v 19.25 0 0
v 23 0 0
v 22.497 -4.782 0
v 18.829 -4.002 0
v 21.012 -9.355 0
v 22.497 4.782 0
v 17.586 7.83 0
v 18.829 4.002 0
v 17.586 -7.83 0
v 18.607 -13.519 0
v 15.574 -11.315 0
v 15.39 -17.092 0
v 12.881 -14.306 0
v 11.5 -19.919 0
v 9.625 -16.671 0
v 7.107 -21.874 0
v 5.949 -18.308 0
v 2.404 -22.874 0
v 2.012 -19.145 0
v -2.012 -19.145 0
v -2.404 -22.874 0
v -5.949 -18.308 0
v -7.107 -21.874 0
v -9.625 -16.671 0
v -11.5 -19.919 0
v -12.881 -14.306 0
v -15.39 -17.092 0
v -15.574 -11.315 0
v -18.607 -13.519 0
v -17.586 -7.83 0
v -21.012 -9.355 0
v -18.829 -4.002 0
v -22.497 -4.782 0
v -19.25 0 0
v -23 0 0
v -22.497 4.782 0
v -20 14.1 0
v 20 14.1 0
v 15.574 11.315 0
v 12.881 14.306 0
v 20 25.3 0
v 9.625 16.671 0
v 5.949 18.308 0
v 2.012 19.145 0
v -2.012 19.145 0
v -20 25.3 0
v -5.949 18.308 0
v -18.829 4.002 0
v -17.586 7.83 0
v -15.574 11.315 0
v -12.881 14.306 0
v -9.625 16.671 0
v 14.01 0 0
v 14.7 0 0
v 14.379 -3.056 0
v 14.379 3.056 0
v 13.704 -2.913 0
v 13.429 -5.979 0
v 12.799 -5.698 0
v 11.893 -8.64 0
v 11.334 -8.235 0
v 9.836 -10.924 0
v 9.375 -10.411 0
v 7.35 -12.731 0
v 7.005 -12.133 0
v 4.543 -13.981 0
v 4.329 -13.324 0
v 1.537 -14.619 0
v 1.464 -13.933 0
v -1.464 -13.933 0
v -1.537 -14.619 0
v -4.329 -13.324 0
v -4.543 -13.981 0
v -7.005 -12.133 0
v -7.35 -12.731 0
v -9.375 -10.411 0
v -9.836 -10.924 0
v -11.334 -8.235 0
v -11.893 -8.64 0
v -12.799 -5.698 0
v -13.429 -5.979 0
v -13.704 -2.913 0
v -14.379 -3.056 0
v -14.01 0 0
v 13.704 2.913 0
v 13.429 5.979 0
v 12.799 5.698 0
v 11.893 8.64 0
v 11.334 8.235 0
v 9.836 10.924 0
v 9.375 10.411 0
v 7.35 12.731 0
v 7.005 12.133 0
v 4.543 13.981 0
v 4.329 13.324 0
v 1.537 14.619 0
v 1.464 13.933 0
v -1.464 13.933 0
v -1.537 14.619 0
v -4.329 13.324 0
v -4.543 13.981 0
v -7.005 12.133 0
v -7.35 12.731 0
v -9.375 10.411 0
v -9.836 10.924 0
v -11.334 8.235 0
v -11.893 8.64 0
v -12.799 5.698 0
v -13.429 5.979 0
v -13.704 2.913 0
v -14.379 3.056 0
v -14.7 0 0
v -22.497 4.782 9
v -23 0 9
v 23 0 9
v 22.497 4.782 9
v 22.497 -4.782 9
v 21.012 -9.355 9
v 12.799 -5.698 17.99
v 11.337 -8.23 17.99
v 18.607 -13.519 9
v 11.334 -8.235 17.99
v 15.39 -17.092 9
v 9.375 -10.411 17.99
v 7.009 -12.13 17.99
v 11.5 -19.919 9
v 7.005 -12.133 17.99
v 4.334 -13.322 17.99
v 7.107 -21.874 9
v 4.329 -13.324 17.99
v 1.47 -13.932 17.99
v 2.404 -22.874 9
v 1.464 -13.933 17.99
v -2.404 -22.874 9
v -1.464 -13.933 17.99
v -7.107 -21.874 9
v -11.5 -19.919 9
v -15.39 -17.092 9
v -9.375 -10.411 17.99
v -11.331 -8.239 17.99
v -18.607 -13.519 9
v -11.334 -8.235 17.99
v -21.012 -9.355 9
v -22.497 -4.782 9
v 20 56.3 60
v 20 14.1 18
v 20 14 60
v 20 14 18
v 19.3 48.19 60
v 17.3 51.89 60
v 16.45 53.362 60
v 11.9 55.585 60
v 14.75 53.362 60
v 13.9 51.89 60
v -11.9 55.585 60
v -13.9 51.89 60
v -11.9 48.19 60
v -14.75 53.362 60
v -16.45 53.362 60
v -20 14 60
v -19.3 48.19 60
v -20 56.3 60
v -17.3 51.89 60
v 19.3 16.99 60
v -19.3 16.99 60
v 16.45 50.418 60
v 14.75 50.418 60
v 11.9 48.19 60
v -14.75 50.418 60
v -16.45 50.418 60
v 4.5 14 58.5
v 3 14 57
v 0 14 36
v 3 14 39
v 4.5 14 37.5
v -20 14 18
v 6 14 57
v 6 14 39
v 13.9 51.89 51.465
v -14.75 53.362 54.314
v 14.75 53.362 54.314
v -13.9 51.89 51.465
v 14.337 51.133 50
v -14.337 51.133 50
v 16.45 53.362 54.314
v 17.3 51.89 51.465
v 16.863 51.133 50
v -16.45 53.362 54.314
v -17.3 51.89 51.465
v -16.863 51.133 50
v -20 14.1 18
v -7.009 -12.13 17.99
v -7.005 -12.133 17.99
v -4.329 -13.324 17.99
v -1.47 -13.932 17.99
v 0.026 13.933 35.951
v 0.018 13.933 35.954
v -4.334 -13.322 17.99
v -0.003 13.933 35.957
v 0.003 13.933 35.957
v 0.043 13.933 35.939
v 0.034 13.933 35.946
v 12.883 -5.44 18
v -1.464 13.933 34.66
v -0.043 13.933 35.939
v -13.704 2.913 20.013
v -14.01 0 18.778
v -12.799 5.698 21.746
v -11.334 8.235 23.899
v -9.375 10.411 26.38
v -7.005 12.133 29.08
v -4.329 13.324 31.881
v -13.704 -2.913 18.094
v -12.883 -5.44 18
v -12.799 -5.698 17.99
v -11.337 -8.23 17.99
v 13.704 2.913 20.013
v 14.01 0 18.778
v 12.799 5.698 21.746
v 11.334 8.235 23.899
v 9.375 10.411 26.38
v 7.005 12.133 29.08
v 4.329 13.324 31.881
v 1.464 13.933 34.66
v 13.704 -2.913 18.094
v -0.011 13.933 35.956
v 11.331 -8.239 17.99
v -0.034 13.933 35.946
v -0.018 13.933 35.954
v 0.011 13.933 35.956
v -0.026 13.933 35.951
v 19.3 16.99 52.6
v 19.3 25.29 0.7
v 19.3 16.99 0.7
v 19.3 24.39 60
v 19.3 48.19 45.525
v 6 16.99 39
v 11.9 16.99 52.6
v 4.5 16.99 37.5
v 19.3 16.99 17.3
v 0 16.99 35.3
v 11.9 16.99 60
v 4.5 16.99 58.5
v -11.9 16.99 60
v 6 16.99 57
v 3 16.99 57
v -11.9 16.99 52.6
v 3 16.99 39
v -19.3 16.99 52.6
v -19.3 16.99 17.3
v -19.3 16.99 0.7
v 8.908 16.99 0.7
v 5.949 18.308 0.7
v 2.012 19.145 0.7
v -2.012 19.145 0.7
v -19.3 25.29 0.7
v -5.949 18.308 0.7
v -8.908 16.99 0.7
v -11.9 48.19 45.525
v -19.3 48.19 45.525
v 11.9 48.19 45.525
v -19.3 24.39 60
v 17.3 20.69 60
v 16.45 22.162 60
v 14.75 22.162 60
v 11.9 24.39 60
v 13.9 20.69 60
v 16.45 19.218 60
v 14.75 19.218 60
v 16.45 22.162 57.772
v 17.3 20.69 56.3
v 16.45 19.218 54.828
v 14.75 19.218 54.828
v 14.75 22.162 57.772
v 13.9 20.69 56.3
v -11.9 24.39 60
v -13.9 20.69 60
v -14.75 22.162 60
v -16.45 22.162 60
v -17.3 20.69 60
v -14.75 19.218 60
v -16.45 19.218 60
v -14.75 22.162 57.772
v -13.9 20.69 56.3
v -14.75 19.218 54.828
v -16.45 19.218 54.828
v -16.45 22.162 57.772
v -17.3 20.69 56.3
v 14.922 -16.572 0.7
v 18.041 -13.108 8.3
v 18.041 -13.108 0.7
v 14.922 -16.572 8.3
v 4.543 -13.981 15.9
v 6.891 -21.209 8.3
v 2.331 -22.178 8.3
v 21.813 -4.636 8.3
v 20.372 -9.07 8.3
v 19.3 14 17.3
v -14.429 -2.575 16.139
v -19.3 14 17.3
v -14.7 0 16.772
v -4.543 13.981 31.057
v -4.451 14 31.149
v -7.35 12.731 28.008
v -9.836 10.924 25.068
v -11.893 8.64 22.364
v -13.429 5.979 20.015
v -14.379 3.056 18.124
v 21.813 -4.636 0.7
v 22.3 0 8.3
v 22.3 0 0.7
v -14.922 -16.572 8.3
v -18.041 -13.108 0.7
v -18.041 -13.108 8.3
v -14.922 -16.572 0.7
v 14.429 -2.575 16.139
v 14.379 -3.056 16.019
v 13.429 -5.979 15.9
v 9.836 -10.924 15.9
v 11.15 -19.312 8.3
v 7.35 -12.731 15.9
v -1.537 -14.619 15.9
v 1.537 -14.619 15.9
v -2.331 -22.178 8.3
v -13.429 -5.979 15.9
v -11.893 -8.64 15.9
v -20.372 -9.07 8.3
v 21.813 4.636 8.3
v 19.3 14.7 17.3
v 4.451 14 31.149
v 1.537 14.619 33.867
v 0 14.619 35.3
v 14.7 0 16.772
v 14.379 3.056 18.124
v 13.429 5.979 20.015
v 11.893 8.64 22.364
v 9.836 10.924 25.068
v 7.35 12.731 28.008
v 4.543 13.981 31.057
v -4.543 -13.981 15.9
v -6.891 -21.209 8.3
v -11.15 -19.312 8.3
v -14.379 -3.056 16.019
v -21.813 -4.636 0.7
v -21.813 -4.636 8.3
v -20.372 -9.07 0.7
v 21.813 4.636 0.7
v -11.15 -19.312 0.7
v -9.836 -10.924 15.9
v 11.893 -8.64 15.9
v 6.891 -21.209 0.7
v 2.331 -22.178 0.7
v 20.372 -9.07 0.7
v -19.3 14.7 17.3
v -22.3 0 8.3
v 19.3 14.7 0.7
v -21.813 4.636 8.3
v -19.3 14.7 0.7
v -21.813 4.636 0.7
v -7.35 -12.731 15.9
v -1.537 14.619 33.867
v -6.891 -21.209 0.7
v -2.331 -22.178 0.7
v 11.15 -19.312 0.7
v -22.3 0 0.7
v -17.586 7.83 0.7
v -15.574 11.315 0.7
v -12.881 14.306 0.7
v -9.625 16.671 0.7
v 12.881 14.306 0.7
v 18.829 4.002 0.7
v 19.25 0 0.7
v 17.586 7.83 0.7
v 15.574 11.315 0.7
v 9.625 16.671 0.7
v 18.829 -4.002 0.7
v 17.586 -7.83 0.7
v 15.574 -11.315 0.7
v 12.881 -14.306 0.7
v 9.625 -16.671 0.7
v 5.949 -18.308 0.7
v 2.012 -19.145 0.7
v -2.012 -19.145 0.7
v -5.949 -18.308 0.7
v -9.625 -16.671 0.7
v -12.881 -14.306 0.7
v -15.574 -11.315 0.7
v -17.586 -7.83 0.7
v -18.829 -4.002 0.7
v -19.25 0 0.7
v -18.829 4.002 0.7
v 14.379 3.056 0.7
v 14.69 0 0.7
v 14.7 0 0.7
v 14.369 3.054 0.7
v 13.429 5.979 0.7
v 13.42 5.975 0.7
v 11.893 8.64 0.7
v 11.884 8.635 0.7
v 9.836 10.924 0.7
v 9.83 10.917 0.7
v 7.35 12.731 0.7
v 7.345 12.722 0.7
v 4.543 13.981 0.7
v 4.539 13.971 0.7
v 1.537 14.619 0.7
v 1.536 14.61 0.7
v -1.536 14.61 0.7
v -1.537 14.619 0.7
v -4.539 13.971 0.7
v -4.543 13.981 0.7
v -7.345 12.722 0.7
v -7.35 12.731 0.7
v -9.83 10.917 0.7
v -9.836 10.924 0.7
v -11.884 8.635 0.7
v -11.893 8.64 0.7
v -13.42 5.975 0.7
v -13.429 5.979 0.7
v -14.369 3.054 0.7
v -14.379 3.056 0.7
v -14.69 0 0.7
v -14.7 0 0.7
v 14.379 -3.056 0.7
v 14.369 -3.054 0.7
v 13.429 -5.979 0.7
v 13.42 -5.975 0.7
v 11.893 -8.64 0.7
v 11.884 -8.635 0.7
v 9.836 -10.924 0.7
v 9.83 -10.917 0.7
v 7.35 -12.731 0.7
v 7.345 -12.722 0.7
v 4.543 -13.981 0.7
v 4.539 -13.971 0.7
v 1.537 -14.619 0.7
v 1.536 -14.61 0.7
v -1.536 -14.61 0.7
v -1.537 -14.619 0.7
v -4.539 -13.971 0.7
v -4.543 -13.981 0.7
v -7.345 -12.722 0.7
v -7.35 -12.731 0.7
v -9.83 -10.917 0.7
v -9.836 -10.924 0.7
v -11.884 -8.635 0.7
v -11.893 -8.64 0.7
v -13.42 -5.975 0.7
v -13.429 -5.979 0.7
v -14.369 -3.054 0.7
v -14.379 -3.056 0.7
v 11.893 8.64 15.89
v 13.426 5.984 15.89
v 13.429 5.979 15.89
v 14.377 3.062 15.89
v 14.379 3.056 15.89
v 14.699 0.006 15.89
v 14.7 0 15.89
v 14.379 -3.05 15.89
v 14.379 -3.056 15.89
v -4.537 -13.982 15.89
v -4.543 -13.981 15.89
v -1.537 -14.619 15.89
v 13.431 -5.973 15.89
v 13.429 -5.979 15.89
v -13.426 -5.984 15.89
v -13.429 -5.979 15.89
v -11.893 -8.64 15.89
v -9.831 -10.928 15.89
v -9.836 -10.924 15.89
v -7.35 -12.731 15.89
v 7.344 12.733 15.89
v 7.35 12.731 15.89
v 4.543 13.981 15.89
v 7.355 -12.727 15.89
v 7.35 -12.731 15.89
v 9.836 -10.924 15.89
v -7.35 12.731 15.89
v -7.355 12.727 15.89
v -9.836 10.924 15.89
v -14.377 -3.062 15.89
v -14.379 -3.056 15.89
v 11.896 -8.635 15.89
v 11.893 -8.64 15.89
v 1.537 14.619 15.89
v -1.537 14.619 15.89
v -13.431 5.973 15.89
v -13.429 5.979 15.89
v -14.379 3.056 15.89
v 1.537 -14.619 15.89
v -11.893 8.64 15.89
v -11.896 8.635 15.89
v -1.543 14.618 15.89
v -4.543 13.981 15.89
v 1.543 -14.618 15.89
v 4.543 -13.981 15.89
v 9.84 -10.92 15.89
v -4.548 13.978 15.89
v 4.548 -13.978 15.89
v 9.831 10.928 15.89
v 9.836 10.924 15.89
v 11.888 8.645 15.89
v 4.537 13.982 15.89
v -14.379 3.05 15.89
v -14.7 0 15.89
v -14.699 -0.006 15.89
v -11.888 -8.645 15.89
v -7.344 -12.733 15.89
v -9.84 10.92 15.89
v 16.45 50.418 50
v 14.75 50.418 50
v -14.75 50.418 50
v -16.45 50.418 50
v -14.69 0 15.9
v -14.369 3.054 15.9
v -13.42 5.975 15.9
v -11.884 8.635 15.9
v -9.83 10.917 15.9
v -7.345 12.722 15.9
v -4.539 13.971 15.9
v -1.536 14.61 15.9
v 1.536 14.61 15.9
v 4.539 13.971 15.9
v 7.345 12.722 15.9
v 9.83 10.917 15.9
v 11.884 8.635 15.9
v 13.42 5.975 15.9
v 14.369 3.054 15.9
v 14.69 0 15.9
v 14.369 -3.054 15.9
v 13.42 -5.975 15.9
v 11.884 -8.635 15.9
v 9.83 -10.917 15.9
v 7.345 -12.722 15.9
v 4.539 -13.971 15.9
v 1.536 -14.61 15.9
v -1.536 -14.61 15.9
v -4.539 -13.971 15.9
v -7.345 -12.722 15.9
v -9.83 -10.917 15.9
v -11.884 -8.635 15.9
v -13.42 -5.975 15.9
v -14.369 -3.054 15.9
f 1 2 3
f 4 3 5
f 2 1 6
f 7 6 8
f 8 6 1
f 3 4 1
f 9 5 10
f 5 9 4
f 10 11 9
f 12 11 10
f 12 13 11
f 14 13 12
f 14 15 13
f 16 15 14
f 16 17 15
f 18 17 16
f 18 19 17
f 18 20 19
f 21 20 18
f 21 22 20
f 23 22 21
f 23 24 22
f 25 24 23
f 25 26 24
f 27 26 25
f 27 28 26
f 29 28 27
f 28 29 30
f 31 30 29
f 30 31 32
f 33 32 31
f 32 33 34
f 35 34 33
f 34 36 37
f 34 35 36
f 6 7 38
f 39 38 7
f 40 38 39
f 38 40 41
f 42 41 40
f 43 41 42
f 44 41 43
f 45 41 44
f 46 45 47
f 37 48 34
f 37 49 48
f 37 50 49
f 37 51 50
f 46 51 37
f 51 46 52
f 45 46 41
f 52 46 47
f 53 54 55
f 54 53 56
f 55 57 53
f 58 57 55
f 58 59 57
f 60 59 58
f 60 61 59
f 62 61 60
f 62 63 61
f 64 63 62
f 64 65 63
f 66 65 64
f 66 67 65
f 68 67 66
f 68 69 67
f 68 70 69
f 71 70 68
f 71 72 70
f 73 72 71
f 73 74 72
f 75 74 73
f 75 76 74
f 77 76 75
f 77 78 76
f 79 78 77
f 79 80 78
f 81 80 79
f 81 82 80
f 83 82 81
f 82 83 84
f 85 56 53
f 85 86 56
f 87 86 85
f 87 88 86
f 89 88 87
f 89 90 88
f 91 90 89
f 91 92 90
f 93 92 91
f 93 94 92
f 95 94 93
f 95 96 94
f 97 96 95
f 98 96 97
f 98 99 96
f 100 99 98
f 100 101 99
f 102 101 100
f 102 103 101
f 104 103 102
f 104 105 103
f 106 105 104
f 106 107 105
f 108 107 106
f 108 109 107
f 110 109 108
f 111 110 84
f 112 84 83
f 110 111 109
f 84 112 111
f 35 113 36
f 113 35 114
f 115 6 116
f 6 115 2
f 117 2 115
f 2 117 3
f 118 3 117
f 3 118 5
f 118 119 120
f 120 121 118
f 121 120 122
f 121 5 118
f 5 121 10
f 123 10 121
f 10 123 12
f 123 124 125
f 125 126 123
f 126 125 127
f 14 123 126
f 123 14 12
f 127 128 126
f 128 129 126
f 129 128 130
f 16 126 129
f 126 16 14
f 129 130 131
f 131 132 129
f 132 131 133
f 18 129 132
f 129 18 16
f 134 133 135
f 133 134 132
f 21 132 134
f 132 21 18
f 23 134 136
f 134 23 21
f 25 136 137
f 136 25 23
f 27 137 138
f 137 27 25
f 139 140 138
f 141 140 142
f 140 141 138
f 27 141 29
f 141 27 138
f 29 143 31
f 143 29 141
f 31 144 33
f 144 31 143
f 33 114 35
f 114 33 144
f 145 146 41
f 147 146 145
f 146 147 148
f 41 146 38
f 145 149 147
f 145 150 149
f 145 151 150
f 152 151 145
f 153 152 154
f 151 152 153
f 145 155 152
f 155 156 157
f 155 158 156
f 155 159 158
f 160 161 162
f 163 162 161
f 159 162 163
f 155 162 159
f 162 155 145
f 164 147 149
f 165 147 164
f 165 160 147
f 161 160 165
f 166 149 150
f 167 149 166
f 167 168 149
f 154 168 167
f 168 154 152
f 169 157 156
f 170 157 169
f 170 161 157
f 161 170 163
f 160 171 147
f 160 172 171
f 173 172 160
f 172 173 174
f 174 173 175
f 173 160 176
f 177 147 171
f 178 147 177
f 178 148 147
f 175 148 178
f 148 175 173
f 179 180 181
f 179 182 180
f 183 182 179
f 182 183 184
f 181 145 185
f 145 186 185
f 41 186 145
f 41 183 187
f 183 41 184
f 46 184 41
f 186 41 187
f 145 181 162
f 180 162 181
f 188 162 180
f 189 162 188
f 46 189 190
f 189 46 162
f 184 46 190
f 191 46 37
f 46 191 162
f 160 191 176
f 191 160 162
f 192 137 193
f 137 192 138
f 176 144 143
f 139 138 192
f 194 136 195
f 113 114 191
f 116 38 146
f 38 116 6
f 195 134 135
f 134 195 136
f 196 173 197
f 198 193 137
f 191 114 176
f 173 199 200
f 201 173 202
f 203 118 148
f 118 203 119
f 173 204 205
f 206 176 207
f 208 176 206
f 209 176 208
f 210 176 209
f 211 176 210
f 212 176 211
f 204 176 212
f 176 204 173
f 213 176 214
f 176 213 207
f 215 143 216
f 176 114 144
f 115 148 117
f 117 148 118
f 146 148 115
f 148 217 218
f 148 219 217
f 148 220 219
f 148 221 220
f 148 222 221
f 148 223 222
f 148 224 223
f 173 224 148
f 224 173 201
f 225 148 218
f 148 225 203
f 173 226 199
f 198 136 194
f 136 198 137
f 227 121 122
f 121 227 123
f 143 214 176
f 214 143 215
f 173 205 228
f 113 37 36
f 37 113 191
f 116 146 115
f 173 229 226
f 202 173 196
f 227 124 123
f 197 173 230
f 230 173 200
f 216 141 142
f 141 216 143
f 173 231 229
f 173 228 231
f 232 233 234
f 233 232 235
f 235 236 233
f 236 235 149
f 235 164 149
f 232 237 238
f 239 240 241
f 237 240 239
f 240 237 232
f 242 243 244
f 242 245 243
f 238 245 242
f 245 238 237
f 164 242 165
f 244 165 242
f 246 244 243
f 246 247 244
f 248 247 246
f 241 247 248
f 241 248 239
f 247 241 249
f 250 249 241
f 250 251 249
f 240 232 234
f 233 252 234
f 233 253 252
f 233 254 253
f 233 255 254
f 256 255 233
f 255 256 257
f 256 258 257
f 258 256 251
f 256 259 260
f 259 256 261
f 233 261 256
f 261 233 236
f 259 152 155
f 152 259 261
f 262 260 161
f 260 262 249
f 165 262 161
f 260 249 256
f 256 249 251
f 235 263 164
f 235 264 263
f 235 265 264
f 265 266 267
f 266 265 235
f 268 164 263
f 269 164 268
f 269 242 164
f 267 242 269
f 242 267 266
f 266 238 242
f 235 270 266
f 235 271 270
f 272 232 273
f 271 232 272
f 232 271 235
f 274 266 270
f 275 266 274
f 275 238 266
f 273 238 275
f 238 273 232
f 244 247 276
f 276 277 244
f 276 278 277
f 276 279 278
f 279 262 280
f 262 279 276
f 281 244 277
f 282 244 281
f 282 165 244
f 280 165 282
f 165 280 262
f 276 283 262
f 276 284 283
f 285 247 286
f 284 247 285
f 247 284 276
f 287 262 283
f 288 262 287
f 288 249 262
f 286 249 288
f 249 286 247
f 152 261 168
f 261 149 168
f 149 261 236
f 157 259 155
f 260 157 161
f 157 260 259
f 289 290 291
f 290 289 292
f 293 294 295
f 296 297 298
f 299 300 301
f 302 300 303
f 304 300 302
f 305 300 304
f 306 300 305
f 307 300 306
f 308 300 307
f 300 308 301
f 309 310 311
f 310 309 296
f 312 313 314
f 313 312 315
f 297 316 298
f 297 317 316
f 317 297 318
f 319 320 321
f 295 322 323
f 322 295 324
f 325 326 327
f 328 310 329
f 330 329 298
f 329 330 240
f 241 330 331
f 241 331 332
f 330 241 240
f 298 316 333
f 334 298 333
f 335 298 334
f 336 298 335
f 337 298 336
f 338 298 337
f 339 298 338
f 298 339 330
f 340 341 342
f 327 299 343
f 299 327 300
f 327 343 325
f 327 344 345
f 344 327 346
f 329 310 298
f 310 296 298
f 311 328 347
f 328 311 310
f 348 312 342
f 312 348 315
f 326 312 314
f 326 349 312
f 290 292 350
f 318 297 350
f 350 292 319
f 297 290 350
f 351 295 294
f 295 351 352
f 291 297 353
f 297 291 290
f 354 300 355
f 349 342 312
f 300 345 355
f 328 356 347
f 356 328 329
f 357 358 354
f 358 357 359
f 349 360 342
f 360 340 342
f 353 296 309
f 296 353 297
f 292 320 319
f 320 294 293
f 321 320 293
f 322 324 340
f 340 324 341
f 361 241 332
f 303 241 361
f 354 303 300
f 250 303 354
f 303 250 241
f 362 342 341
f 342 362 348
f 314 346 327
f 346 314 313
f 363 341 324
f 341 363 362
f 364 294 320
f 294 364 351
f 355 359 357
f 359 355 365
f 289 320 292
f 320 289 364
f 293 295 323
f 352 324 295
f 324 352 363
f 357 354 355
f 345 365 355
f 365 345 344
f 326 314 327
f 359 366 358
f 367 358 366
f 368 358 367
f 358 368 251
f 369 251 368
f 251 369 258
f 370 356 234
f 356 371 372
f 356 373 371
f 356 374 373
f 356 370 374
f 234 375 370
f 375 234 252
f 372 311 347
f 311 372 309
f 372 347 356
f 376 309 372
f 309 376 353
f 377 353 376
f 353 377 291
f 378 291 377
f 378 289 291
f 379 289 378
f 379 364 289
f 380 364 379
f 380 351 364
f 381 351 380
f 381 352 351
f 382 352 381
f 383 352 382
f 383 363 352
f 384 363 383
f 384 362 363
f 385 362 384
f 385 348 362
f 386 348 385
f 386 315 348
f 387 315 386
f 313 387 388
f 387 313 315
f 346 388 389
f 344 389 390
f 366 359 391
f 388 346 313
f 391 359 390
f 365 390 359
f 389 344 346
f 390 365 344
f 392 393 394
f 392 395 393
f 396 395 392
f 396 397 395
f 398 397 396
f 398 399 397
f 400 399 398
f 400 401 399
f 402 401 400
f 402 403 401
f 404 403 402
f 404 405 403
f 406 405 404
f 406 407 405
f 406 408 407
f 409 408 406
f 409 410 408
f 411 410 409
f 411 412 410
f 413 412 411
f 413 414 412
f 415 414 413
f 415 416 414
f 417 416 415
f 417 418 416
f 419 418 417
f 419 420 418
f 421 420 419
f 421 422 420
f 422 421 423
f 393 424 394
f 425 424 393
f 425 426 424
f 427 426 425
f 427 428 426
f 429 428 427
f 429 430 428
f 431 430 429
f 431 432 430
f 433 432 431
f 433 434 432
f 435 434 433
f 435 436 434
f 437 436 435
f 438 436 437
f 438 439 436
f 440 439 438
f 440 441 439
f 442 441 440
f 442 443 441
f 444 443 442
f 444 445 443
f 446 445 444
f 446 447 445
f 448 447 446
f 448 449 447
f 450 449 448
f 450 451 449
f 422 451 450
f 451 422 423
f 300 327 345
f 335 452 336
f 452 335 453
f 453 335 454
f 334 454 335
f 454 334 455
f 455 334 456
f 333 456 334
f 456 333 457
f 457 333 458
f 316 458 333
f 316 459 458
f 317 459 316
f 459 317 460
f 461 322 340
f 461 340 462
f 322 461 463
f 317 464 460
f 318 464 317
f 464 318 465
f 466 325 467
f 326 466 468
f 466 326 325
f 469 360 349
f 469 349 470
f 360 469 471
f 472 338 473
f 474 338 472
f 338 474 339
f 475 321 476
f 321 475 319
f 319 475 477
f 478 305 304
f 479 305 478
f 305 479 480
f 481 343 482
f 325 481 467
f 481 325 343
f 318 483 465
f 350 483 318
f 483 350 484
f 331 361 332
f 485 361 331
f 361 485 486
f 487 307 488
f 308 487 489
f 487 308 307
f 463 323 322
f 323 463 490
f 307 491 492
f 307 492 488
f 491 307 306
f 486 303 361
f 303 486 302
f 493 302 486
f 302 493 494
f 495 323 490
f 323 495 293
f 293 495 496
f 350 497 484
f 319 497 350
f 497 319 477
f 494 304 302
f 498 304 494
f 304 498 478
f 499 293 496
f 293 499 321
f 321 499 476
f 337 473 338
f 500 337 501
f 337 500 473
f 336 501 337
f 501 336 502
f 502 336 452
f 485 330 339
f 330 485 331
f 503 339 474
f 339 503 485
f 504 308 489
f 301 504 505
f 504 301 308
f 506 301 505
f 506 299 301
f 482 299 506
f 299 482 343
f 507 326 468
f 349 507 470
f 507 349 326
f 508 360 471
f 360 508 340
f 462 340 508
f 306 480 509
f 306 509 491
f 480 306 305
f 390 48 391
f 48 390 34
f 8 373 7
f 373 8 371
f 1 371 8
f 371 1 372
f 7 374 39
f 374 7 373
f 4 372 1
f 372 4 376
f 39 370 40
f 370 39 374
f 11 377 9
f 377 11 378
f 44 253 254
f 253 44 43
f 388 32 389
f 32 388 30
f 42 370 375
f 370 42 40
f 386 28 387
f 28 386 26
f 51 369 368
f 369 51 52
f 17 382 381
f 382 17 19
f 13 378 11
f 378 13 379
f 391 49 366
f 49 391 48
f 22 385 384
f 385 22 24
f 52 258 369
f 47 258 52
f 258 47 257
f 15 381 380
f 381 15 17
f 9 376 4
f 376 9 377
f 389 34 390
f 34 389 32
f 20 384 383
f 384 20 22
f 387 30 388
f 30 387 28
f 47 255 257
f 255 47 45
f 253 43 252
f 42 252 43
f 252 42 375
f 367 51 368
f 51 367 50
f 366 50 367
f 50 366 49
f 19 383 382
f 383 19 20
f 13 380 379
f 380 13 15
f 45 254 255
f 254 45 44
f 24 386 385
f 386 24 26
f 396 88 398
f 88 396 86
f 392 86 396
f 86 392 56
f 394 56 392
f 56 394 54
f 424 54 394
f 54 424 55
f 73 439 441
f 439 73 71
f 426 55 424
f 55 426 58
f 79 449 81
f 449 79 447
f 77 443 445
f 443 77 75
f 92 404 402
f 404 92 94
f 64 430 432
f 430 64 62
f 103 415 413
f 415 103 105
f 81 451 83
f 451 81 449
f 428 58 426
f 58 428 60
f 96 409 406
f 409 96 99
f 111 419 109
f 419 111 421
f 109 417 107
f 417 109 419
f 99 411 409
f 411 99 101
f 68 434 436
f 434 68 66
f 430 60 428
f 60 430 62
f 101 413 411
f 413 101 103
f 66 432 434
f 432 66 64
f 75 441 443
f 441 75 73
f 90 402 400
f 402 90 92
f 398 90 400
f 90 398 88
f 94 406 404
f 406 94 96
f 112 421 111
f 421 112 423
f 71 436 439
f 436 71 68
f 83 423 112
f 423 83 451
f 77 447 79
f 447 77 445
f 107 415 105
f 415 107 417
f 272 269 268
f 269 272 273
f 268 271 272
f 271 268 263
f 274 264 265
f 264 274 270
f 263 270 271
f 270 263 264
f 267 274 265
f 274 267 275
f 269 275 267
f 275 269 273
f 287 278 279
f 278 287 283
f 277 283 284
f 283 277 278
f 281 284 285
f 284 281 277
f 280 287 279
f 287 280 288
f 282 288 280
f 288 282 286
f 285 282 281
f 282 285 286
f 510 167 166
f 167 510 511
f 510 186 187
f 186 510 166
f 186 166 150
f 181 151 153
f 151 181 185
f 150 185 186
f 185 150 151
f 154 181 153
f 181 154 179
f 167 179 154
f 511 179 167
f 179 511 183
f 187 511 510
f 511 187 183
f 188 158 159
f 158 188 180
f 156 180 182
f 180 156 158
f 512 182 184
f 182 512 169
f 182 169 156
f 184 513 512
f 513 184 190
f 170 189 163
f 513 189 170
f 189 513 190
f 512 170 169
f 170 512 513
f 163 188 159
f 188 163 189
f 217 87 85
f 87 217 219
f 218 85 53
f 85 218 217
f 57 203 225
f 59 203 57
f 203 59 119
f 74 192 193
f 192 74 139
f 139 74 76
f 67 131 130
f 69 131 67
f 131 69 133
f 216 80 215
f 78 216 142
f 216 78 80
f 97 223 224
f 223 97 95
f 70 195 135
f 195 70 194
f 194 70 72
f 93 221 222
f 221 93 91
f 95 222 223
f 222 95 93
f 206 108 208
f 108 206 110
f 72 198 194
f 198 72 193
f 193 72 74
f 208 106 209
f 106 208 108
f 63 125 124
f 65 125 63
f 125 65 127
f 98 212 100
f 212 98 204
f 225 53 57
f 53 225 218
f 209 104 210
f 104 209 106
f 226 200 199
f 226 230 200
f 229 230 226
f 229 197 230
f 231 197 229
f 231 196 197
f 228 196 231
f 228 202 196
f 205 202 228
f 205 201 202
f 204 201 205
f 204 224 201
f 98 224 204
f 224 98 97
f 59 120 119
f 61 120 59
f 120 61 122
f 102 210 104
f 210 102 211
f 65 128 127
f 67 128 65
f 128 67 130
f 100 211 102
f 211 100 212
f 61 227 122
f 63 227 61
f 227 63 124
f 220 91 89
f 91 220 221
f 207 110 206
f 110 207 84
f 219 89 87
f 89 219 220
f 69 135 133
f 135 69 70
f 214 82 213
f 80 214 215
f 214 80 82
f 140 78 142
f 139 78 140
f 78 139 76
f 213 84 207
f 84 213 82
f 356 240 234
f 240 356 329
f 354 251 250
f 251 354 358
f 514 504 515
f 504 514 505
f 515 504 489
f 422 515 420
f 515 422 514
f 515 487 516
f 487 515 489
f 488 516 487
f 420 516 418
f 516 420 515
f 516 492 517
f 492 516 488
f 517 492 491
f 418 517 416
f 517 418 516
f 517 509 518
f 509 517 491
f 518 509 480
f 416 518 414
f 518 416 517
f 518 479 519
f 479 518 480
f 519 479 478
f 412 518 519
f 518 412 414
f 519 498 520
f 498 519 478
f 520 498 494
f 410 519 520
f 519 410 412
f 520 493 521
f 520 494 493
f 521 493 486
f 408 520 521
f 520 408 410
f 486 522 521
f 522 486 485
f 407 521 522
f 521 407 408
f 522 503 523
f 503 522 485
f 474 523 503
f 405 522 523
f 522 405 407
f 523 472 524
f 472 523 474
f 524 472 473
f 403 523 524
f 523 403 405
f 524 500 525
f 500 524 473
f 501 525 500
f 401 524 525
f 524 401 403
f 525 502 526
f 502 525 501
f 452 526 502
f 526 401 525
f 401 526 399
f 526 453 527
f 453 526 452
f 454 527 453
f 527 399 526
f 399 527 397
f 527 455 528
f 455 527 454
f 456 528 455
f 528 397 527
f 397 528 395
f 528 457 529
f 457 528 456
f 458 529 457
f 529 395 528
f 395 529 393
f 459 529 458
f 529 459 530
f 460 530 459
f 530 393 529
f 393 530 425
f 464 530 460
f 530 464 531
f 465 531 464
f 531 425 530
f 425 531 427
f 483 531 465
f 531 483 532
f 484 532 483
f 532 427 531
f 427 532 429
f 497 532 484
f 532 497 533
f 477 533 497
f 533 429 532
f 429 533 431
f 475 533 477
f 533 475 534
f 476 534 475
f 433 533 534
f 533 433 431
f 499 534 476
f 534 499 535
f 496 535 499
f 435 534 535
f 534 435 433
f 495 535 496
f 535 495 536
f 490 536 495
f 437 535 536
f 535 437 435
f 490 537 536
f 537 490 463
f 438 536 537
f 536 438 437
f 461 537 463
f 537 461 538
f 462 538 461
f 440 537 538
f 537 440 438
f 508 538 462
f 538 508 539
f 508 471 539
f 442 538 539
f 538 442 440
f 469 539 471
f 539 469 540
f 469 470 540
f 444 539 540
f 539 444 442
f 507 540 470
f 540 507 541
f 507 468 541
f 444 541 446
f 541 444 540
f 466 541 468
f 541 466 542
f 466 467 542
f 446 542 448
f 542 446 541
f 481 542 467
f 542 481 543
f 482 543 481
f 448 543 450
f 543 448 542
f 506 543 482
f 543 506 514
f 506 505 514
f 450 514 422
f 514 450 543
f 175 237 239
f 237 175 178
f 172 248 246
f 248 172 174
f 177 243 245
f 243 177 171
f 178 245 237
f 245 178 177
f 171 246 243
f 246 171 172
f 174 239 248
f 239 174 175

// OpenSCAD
/*
Copyright (c) 2014, Steven Presser
All rights reserved.

Redistribution and use in source and binary forms, with or without modification, are permitted provided that the following conditions are met:

1. Redistributions of source code must retain the above copyright notice, this list of conditions and the following disclaimer.

2. Redistributions in binary form must reproduce the above copyright notice, this list of conditions and the following disclaimer in the documentation and/or other materials provided with the distribution.

3. Neither the name of the copyright holder nor the names of its contributors may be used to endorse or promote products derived from this software without specific prior written permission.

THIS SOFTWARE IS PROVIDED BY THE COPYRIGHT HOLDERS AND CONTRIBUTORS "AS IS" AND ANY EXPRESS OR IMPLIED WARRANTIES, INCLUDING, BUT NOT LIMITED TO, THE IMPLIED WARRANTIES OF MERCHANTABILITY AND FITNESS FOR A PARTICULAR PURPOSE ARE DISCLAIMED. IN NO EVENT SHALL THE COPYRIGHT HOLDER OR CONTRIBUTORS BE LIABLE FOR ANY DIRECT, INDIRECT, INCIDENTAL, SPECIAL, EXEMPLARY, OR CONSEQUENTIAL DAMAGES (INCLUDING, BUT NOT LIMITED TO, PROCUREMENT OF SUBSTITUTE GOODS OR SERVICES; LOSS OF USE, DATA, OR PROFITS; OR BUSINESS INTERRUPTION) HOWEVER CAUSED AND ON ANY THEORY OF LIABILITY, WHETHER IN CONTRACT, STRICT LIABILITY, OR TORT (INCLUDING NEGLIGENCE OR OTHERWISE) ARISING IN ANY WAY OUT OF THE USE OF THIS SOFTWARE, EVEN IF ADVISED OF THE POSSIBILITY OF SUCH DAMAGE.
*/

//General settings
printheadRadius=14; //The size of the center of the torus - where the printhead goes
fanSize=40; // We assume a square fan.  The length of one side of the square
ductRadius=9; //How big is the torus surrounding the printhead?  This is the hoizontal length and 1/2 the vertical height
outletGap=4.55; //How wide the gap on the bottom of the torus is to release air
wallThickness=0.7; //How thick are all of the walls in this model?

// The attachment is the part you use to mount the duct to the printer.  The fan sits on top
attachHeight=60; //How tall is the portion where the fan mounts?
attachYOffset=0; //allows you to move the attachment along the y axis to center the duct
attachXOffset=4.5; //allows you to move the SCReW HOLE along the x axis to center the duct

// These control things about the wall which actually gets screwed into the printer
mountScrewWidth=3; //How wide is the hole?
mountThickness=3; //How thick is that wall?  For thermal protection (the walls melt if they're too thin) this should be enough that when sliced there is internal support structure.

//Fan mount details
fanMountWidth=7.4; //how much extra to add at the edges for mounts, hole automagically placed halfway
fanMountHole=1.7; //radius of the screw hole
fanMountDepth=10; //depth of screw hole

// Magic variable to keep us 'simple'.  Should make no appreciable changes in the model.  Reduce if so desired.
fudge=0.01;

if (fanSize>attachHeight) {
	echo("WARNING: fan size is greater than attachHeight.  Model will not be 45-degree rule compatible");
}

module roundDuct(ductRadius) {
	polygon(points=[[0,0],[0,2*ductRadius],[ductRadius,ductRadius],[ductRadius,0]]);
}

module fanScrewMount () {
	rotate([0,-90,0]) 
		linear_extrude(height=fanMountWidth) polygon(points=[
			[0,0],
			[fanMountWidth,0],
			[fanMountWidth,fanMountWidth],
		]);
}

//The printhead we're doing all this around
//color("red") cylinder(r=printheadRadius,h=attachHeight);

// We'll cut parts out after we make the whole thing
difference() {
	//do the making
	union() {
		// stuff around the printhead
		rotate_extrude() translate([printheadRadius,0,0]) roundDuct(ductRadius);
		//fan mount
		translate([fanSize/2,printheadRadius,0]) rotate([0,-90,0]) linear_extrude(height=fanSize)
			polygon(points=[
				[0,max(attachYOffset,0)],
				[attachHeight,max(attachYOffset,0)],
				[attachHeight,fanSize+max(attachYOffset,0)+mountThickness-wallThickness],
				[0,max(ductRadius,ductRadius+attachYOffset)+mountThickness-wallThickness]]
			);
		//hull to make them attach sanely
		// ceter part cut later
		hull () {
			rotate_extrude() translate([printheadRadius,0,0]) roundDuct(ductRadius);
			rotate([0,90,90]) translate([0,-fanSize/2,max(printheadRadius,printheadRadius+attachYOffset)]) rotate([0,0,90]) linear_extrude(height=0.1) polygon(points=[
					[0,0],
					[fanSize,0],
					[fanSize,2*ductRadius],
					[fanSize/2,4*ductRadius],
					[0,2*ductRadius]
					]
			);
		}
		if (attachYOffset<0) {
			translate([-fanSize/2,printheadRadius+attachYOffset,0]) cube([fanSize,max(mountThickness, -attachYOffset+wallThickness), attachHeight]);
		}
	}
	// center for printhead
	cylinder(r=printheadRadius+fudge,h=4*ductRadius);
	translate([0,0,4*ductRadius]) cylinder(r1=printheadRadius,r2=0,h=printheadRadius);

	//fan
	translate([fanSize/2-wallThickness,printheadRadius-fudge,0]) difference() {
		rotate([0,-90,0]) linear_extrude(height=fanSize-2*wallThickness) 
			polygon(points=[
				[wallThickness,max(attachYOffset,0)+mountThickness],
				[attachHeight+fudge,max(attachYOffset,0)+mountThickness],
				[attachHeight+fudge,fanSize-2*wallThickness+max(attachYOffset,0)+mountThickness],
				[wallThickness,max(ductRadius, ductRadius+attachYOffset)+mountThickness-wallThickness],
		]);
		translate([0,mountThickness+max(attachYOffset,0),attachHeight-fanMountWidth]) fanScrewMount();
		translate([-fanSize+2*wallThickness+fanMountWidth,max(attachYOffset,0)+mountThickness,attachHeight-fanMountWidth]) fanScrewMount();
		translate([-fanMountWidth,fanSize-fanMountWidth-2*wallThickness+max(attachYOffset,0)+mountThickness,0]) cube([fanMountWidth,fanMountWidth,attachHeight]);
		translate([-fanSize+2*wallThickness,fanSize-fanMountWidth-2*wallThickness+max(attachYOffset,0)+mountThickness,0]) cube([fanMountWidth,fanMountWidth,attachHeight]);
	}
	
	// this one is complicated, we only want to make cuts that are not covered by the duct itself.
	// empty space in the duct
	difference() {
		hull () {
			rotate_extrude() translate([printheadRadius+wallThickness,wallThickness,0]) roundDuct(ductRadius-2*wallThickness);
			rotate([0,90,90]) translate([-wallThickness,-fanSize/2+wallThickness,max(printheadRadius,printheadRadius+attachYOffset)]) rotate([0,0,90]) linear_extrude(height=wallThickness) polygon(points=[
					[0,0],
					[fanSize-2*wallThickness,0],
					[fanSize-2*wallThickness,2*ductRadius-2*wallThickness],
					[fanSize/2-wallThickness,4*ductRadius-2*wallThickness],
					[0,2*ductRadius-2*wallThickness]
					]
			);
		}
		cylinder(r=printheadRadius+wallThickness,h=4*ductRadius);
	}
	#rotate([0,90,90]) translate([-wallThickness,-fanSize/2+wallThickness,max(printheadRadius+wallThickness,printheadRadius+attachYOffset+wallThickness)]) rotate([0,0,90]) linear_extrude(height=mountThickness-wallThickness) polygon(points=[
			[0,0],
			[fanSize-2*wallThickness,0],
			[fanSize-2*wallThickness,2*ductRadius-2*wallThickness],
			[fanSize/2-wallThickness,4*ductRadius-2*wallThickness],
			[0,2*ductRadius-2*wallThickness]
			]
		);

	//duct inners
	rotate_extrude() translate([printheadRadius+wallThickness-fudge,wallThickness,0]) roundDuct(ductRadius-2*wallThickness);
	//gap to let air out
	translate([0,0,-fudge]) difference() {
		cylinder(r=printheadRadius+wallThickness+outletGap,h=wallThickness+2*fudge);
		cylinder(r=printheadRadius+wallThickness,h=wallThickness+2*fudge);
	}
	
	//screw slot to mount block
	translate([attachXOffset,-2*fudge+attachYOffset,0]) hull() {
		#translate([-mountScrewWidth/2, printheadRadius,4*ductRadius+mountScrewWidth]) rotate([0,45,0]) cube([mountScrewWidth/sqrt(2),max(mountThickness,-attachYOffset+wallThickness)+4*fudge,mountScrewWidth/sqrt(2)]);
		translate([-mountScrewWidth/2, printheadRadius,attachHeight-mountScrewWidth]) rotate([0,45,0]) cube([mountScrewWidth/sqrt(2),max(mountThickness,-attachYOffset+wallThickness)+4*fudge,mountScrewWidth/sqrt(2)]);
	}
	
	//screw holes for mounting fan
	#translate([fanSize/2,printheadRadius-fudge+max(attachYOffset,0)+mountThickness-wallThickness,0]) {
		translate([-wallThickness-fanMountWidth/2,wallThickness+fanMountWidth/2,attachHeight-fanMountDepth]) cylinder(r=fanMountHole,h=fanMountDepth);
		translate([wallThickness+fanMountWidth/2-fanSize,wallThickness+fanMountWidth/2,attachHeight-fanMountDepth]) cylinder(r=fanMountHole,h=fanMountDepth);
		translate([-wallThickness-fanMountWidth/2,-wallThickness-fanMountWidth/2+fanSize,attachHeight-fanMountDepth]) cylinder(r=fanMountHole,h=fanMountDepth);
		translate([wallThickness+fanMountWidth/2-fanSize,-wallThickness-fanMountWidth/2+fanSize,attachHeight-fanMountDepth]) cylinder(r=fanMountHole,h=fanMountDepth);
	}
}
